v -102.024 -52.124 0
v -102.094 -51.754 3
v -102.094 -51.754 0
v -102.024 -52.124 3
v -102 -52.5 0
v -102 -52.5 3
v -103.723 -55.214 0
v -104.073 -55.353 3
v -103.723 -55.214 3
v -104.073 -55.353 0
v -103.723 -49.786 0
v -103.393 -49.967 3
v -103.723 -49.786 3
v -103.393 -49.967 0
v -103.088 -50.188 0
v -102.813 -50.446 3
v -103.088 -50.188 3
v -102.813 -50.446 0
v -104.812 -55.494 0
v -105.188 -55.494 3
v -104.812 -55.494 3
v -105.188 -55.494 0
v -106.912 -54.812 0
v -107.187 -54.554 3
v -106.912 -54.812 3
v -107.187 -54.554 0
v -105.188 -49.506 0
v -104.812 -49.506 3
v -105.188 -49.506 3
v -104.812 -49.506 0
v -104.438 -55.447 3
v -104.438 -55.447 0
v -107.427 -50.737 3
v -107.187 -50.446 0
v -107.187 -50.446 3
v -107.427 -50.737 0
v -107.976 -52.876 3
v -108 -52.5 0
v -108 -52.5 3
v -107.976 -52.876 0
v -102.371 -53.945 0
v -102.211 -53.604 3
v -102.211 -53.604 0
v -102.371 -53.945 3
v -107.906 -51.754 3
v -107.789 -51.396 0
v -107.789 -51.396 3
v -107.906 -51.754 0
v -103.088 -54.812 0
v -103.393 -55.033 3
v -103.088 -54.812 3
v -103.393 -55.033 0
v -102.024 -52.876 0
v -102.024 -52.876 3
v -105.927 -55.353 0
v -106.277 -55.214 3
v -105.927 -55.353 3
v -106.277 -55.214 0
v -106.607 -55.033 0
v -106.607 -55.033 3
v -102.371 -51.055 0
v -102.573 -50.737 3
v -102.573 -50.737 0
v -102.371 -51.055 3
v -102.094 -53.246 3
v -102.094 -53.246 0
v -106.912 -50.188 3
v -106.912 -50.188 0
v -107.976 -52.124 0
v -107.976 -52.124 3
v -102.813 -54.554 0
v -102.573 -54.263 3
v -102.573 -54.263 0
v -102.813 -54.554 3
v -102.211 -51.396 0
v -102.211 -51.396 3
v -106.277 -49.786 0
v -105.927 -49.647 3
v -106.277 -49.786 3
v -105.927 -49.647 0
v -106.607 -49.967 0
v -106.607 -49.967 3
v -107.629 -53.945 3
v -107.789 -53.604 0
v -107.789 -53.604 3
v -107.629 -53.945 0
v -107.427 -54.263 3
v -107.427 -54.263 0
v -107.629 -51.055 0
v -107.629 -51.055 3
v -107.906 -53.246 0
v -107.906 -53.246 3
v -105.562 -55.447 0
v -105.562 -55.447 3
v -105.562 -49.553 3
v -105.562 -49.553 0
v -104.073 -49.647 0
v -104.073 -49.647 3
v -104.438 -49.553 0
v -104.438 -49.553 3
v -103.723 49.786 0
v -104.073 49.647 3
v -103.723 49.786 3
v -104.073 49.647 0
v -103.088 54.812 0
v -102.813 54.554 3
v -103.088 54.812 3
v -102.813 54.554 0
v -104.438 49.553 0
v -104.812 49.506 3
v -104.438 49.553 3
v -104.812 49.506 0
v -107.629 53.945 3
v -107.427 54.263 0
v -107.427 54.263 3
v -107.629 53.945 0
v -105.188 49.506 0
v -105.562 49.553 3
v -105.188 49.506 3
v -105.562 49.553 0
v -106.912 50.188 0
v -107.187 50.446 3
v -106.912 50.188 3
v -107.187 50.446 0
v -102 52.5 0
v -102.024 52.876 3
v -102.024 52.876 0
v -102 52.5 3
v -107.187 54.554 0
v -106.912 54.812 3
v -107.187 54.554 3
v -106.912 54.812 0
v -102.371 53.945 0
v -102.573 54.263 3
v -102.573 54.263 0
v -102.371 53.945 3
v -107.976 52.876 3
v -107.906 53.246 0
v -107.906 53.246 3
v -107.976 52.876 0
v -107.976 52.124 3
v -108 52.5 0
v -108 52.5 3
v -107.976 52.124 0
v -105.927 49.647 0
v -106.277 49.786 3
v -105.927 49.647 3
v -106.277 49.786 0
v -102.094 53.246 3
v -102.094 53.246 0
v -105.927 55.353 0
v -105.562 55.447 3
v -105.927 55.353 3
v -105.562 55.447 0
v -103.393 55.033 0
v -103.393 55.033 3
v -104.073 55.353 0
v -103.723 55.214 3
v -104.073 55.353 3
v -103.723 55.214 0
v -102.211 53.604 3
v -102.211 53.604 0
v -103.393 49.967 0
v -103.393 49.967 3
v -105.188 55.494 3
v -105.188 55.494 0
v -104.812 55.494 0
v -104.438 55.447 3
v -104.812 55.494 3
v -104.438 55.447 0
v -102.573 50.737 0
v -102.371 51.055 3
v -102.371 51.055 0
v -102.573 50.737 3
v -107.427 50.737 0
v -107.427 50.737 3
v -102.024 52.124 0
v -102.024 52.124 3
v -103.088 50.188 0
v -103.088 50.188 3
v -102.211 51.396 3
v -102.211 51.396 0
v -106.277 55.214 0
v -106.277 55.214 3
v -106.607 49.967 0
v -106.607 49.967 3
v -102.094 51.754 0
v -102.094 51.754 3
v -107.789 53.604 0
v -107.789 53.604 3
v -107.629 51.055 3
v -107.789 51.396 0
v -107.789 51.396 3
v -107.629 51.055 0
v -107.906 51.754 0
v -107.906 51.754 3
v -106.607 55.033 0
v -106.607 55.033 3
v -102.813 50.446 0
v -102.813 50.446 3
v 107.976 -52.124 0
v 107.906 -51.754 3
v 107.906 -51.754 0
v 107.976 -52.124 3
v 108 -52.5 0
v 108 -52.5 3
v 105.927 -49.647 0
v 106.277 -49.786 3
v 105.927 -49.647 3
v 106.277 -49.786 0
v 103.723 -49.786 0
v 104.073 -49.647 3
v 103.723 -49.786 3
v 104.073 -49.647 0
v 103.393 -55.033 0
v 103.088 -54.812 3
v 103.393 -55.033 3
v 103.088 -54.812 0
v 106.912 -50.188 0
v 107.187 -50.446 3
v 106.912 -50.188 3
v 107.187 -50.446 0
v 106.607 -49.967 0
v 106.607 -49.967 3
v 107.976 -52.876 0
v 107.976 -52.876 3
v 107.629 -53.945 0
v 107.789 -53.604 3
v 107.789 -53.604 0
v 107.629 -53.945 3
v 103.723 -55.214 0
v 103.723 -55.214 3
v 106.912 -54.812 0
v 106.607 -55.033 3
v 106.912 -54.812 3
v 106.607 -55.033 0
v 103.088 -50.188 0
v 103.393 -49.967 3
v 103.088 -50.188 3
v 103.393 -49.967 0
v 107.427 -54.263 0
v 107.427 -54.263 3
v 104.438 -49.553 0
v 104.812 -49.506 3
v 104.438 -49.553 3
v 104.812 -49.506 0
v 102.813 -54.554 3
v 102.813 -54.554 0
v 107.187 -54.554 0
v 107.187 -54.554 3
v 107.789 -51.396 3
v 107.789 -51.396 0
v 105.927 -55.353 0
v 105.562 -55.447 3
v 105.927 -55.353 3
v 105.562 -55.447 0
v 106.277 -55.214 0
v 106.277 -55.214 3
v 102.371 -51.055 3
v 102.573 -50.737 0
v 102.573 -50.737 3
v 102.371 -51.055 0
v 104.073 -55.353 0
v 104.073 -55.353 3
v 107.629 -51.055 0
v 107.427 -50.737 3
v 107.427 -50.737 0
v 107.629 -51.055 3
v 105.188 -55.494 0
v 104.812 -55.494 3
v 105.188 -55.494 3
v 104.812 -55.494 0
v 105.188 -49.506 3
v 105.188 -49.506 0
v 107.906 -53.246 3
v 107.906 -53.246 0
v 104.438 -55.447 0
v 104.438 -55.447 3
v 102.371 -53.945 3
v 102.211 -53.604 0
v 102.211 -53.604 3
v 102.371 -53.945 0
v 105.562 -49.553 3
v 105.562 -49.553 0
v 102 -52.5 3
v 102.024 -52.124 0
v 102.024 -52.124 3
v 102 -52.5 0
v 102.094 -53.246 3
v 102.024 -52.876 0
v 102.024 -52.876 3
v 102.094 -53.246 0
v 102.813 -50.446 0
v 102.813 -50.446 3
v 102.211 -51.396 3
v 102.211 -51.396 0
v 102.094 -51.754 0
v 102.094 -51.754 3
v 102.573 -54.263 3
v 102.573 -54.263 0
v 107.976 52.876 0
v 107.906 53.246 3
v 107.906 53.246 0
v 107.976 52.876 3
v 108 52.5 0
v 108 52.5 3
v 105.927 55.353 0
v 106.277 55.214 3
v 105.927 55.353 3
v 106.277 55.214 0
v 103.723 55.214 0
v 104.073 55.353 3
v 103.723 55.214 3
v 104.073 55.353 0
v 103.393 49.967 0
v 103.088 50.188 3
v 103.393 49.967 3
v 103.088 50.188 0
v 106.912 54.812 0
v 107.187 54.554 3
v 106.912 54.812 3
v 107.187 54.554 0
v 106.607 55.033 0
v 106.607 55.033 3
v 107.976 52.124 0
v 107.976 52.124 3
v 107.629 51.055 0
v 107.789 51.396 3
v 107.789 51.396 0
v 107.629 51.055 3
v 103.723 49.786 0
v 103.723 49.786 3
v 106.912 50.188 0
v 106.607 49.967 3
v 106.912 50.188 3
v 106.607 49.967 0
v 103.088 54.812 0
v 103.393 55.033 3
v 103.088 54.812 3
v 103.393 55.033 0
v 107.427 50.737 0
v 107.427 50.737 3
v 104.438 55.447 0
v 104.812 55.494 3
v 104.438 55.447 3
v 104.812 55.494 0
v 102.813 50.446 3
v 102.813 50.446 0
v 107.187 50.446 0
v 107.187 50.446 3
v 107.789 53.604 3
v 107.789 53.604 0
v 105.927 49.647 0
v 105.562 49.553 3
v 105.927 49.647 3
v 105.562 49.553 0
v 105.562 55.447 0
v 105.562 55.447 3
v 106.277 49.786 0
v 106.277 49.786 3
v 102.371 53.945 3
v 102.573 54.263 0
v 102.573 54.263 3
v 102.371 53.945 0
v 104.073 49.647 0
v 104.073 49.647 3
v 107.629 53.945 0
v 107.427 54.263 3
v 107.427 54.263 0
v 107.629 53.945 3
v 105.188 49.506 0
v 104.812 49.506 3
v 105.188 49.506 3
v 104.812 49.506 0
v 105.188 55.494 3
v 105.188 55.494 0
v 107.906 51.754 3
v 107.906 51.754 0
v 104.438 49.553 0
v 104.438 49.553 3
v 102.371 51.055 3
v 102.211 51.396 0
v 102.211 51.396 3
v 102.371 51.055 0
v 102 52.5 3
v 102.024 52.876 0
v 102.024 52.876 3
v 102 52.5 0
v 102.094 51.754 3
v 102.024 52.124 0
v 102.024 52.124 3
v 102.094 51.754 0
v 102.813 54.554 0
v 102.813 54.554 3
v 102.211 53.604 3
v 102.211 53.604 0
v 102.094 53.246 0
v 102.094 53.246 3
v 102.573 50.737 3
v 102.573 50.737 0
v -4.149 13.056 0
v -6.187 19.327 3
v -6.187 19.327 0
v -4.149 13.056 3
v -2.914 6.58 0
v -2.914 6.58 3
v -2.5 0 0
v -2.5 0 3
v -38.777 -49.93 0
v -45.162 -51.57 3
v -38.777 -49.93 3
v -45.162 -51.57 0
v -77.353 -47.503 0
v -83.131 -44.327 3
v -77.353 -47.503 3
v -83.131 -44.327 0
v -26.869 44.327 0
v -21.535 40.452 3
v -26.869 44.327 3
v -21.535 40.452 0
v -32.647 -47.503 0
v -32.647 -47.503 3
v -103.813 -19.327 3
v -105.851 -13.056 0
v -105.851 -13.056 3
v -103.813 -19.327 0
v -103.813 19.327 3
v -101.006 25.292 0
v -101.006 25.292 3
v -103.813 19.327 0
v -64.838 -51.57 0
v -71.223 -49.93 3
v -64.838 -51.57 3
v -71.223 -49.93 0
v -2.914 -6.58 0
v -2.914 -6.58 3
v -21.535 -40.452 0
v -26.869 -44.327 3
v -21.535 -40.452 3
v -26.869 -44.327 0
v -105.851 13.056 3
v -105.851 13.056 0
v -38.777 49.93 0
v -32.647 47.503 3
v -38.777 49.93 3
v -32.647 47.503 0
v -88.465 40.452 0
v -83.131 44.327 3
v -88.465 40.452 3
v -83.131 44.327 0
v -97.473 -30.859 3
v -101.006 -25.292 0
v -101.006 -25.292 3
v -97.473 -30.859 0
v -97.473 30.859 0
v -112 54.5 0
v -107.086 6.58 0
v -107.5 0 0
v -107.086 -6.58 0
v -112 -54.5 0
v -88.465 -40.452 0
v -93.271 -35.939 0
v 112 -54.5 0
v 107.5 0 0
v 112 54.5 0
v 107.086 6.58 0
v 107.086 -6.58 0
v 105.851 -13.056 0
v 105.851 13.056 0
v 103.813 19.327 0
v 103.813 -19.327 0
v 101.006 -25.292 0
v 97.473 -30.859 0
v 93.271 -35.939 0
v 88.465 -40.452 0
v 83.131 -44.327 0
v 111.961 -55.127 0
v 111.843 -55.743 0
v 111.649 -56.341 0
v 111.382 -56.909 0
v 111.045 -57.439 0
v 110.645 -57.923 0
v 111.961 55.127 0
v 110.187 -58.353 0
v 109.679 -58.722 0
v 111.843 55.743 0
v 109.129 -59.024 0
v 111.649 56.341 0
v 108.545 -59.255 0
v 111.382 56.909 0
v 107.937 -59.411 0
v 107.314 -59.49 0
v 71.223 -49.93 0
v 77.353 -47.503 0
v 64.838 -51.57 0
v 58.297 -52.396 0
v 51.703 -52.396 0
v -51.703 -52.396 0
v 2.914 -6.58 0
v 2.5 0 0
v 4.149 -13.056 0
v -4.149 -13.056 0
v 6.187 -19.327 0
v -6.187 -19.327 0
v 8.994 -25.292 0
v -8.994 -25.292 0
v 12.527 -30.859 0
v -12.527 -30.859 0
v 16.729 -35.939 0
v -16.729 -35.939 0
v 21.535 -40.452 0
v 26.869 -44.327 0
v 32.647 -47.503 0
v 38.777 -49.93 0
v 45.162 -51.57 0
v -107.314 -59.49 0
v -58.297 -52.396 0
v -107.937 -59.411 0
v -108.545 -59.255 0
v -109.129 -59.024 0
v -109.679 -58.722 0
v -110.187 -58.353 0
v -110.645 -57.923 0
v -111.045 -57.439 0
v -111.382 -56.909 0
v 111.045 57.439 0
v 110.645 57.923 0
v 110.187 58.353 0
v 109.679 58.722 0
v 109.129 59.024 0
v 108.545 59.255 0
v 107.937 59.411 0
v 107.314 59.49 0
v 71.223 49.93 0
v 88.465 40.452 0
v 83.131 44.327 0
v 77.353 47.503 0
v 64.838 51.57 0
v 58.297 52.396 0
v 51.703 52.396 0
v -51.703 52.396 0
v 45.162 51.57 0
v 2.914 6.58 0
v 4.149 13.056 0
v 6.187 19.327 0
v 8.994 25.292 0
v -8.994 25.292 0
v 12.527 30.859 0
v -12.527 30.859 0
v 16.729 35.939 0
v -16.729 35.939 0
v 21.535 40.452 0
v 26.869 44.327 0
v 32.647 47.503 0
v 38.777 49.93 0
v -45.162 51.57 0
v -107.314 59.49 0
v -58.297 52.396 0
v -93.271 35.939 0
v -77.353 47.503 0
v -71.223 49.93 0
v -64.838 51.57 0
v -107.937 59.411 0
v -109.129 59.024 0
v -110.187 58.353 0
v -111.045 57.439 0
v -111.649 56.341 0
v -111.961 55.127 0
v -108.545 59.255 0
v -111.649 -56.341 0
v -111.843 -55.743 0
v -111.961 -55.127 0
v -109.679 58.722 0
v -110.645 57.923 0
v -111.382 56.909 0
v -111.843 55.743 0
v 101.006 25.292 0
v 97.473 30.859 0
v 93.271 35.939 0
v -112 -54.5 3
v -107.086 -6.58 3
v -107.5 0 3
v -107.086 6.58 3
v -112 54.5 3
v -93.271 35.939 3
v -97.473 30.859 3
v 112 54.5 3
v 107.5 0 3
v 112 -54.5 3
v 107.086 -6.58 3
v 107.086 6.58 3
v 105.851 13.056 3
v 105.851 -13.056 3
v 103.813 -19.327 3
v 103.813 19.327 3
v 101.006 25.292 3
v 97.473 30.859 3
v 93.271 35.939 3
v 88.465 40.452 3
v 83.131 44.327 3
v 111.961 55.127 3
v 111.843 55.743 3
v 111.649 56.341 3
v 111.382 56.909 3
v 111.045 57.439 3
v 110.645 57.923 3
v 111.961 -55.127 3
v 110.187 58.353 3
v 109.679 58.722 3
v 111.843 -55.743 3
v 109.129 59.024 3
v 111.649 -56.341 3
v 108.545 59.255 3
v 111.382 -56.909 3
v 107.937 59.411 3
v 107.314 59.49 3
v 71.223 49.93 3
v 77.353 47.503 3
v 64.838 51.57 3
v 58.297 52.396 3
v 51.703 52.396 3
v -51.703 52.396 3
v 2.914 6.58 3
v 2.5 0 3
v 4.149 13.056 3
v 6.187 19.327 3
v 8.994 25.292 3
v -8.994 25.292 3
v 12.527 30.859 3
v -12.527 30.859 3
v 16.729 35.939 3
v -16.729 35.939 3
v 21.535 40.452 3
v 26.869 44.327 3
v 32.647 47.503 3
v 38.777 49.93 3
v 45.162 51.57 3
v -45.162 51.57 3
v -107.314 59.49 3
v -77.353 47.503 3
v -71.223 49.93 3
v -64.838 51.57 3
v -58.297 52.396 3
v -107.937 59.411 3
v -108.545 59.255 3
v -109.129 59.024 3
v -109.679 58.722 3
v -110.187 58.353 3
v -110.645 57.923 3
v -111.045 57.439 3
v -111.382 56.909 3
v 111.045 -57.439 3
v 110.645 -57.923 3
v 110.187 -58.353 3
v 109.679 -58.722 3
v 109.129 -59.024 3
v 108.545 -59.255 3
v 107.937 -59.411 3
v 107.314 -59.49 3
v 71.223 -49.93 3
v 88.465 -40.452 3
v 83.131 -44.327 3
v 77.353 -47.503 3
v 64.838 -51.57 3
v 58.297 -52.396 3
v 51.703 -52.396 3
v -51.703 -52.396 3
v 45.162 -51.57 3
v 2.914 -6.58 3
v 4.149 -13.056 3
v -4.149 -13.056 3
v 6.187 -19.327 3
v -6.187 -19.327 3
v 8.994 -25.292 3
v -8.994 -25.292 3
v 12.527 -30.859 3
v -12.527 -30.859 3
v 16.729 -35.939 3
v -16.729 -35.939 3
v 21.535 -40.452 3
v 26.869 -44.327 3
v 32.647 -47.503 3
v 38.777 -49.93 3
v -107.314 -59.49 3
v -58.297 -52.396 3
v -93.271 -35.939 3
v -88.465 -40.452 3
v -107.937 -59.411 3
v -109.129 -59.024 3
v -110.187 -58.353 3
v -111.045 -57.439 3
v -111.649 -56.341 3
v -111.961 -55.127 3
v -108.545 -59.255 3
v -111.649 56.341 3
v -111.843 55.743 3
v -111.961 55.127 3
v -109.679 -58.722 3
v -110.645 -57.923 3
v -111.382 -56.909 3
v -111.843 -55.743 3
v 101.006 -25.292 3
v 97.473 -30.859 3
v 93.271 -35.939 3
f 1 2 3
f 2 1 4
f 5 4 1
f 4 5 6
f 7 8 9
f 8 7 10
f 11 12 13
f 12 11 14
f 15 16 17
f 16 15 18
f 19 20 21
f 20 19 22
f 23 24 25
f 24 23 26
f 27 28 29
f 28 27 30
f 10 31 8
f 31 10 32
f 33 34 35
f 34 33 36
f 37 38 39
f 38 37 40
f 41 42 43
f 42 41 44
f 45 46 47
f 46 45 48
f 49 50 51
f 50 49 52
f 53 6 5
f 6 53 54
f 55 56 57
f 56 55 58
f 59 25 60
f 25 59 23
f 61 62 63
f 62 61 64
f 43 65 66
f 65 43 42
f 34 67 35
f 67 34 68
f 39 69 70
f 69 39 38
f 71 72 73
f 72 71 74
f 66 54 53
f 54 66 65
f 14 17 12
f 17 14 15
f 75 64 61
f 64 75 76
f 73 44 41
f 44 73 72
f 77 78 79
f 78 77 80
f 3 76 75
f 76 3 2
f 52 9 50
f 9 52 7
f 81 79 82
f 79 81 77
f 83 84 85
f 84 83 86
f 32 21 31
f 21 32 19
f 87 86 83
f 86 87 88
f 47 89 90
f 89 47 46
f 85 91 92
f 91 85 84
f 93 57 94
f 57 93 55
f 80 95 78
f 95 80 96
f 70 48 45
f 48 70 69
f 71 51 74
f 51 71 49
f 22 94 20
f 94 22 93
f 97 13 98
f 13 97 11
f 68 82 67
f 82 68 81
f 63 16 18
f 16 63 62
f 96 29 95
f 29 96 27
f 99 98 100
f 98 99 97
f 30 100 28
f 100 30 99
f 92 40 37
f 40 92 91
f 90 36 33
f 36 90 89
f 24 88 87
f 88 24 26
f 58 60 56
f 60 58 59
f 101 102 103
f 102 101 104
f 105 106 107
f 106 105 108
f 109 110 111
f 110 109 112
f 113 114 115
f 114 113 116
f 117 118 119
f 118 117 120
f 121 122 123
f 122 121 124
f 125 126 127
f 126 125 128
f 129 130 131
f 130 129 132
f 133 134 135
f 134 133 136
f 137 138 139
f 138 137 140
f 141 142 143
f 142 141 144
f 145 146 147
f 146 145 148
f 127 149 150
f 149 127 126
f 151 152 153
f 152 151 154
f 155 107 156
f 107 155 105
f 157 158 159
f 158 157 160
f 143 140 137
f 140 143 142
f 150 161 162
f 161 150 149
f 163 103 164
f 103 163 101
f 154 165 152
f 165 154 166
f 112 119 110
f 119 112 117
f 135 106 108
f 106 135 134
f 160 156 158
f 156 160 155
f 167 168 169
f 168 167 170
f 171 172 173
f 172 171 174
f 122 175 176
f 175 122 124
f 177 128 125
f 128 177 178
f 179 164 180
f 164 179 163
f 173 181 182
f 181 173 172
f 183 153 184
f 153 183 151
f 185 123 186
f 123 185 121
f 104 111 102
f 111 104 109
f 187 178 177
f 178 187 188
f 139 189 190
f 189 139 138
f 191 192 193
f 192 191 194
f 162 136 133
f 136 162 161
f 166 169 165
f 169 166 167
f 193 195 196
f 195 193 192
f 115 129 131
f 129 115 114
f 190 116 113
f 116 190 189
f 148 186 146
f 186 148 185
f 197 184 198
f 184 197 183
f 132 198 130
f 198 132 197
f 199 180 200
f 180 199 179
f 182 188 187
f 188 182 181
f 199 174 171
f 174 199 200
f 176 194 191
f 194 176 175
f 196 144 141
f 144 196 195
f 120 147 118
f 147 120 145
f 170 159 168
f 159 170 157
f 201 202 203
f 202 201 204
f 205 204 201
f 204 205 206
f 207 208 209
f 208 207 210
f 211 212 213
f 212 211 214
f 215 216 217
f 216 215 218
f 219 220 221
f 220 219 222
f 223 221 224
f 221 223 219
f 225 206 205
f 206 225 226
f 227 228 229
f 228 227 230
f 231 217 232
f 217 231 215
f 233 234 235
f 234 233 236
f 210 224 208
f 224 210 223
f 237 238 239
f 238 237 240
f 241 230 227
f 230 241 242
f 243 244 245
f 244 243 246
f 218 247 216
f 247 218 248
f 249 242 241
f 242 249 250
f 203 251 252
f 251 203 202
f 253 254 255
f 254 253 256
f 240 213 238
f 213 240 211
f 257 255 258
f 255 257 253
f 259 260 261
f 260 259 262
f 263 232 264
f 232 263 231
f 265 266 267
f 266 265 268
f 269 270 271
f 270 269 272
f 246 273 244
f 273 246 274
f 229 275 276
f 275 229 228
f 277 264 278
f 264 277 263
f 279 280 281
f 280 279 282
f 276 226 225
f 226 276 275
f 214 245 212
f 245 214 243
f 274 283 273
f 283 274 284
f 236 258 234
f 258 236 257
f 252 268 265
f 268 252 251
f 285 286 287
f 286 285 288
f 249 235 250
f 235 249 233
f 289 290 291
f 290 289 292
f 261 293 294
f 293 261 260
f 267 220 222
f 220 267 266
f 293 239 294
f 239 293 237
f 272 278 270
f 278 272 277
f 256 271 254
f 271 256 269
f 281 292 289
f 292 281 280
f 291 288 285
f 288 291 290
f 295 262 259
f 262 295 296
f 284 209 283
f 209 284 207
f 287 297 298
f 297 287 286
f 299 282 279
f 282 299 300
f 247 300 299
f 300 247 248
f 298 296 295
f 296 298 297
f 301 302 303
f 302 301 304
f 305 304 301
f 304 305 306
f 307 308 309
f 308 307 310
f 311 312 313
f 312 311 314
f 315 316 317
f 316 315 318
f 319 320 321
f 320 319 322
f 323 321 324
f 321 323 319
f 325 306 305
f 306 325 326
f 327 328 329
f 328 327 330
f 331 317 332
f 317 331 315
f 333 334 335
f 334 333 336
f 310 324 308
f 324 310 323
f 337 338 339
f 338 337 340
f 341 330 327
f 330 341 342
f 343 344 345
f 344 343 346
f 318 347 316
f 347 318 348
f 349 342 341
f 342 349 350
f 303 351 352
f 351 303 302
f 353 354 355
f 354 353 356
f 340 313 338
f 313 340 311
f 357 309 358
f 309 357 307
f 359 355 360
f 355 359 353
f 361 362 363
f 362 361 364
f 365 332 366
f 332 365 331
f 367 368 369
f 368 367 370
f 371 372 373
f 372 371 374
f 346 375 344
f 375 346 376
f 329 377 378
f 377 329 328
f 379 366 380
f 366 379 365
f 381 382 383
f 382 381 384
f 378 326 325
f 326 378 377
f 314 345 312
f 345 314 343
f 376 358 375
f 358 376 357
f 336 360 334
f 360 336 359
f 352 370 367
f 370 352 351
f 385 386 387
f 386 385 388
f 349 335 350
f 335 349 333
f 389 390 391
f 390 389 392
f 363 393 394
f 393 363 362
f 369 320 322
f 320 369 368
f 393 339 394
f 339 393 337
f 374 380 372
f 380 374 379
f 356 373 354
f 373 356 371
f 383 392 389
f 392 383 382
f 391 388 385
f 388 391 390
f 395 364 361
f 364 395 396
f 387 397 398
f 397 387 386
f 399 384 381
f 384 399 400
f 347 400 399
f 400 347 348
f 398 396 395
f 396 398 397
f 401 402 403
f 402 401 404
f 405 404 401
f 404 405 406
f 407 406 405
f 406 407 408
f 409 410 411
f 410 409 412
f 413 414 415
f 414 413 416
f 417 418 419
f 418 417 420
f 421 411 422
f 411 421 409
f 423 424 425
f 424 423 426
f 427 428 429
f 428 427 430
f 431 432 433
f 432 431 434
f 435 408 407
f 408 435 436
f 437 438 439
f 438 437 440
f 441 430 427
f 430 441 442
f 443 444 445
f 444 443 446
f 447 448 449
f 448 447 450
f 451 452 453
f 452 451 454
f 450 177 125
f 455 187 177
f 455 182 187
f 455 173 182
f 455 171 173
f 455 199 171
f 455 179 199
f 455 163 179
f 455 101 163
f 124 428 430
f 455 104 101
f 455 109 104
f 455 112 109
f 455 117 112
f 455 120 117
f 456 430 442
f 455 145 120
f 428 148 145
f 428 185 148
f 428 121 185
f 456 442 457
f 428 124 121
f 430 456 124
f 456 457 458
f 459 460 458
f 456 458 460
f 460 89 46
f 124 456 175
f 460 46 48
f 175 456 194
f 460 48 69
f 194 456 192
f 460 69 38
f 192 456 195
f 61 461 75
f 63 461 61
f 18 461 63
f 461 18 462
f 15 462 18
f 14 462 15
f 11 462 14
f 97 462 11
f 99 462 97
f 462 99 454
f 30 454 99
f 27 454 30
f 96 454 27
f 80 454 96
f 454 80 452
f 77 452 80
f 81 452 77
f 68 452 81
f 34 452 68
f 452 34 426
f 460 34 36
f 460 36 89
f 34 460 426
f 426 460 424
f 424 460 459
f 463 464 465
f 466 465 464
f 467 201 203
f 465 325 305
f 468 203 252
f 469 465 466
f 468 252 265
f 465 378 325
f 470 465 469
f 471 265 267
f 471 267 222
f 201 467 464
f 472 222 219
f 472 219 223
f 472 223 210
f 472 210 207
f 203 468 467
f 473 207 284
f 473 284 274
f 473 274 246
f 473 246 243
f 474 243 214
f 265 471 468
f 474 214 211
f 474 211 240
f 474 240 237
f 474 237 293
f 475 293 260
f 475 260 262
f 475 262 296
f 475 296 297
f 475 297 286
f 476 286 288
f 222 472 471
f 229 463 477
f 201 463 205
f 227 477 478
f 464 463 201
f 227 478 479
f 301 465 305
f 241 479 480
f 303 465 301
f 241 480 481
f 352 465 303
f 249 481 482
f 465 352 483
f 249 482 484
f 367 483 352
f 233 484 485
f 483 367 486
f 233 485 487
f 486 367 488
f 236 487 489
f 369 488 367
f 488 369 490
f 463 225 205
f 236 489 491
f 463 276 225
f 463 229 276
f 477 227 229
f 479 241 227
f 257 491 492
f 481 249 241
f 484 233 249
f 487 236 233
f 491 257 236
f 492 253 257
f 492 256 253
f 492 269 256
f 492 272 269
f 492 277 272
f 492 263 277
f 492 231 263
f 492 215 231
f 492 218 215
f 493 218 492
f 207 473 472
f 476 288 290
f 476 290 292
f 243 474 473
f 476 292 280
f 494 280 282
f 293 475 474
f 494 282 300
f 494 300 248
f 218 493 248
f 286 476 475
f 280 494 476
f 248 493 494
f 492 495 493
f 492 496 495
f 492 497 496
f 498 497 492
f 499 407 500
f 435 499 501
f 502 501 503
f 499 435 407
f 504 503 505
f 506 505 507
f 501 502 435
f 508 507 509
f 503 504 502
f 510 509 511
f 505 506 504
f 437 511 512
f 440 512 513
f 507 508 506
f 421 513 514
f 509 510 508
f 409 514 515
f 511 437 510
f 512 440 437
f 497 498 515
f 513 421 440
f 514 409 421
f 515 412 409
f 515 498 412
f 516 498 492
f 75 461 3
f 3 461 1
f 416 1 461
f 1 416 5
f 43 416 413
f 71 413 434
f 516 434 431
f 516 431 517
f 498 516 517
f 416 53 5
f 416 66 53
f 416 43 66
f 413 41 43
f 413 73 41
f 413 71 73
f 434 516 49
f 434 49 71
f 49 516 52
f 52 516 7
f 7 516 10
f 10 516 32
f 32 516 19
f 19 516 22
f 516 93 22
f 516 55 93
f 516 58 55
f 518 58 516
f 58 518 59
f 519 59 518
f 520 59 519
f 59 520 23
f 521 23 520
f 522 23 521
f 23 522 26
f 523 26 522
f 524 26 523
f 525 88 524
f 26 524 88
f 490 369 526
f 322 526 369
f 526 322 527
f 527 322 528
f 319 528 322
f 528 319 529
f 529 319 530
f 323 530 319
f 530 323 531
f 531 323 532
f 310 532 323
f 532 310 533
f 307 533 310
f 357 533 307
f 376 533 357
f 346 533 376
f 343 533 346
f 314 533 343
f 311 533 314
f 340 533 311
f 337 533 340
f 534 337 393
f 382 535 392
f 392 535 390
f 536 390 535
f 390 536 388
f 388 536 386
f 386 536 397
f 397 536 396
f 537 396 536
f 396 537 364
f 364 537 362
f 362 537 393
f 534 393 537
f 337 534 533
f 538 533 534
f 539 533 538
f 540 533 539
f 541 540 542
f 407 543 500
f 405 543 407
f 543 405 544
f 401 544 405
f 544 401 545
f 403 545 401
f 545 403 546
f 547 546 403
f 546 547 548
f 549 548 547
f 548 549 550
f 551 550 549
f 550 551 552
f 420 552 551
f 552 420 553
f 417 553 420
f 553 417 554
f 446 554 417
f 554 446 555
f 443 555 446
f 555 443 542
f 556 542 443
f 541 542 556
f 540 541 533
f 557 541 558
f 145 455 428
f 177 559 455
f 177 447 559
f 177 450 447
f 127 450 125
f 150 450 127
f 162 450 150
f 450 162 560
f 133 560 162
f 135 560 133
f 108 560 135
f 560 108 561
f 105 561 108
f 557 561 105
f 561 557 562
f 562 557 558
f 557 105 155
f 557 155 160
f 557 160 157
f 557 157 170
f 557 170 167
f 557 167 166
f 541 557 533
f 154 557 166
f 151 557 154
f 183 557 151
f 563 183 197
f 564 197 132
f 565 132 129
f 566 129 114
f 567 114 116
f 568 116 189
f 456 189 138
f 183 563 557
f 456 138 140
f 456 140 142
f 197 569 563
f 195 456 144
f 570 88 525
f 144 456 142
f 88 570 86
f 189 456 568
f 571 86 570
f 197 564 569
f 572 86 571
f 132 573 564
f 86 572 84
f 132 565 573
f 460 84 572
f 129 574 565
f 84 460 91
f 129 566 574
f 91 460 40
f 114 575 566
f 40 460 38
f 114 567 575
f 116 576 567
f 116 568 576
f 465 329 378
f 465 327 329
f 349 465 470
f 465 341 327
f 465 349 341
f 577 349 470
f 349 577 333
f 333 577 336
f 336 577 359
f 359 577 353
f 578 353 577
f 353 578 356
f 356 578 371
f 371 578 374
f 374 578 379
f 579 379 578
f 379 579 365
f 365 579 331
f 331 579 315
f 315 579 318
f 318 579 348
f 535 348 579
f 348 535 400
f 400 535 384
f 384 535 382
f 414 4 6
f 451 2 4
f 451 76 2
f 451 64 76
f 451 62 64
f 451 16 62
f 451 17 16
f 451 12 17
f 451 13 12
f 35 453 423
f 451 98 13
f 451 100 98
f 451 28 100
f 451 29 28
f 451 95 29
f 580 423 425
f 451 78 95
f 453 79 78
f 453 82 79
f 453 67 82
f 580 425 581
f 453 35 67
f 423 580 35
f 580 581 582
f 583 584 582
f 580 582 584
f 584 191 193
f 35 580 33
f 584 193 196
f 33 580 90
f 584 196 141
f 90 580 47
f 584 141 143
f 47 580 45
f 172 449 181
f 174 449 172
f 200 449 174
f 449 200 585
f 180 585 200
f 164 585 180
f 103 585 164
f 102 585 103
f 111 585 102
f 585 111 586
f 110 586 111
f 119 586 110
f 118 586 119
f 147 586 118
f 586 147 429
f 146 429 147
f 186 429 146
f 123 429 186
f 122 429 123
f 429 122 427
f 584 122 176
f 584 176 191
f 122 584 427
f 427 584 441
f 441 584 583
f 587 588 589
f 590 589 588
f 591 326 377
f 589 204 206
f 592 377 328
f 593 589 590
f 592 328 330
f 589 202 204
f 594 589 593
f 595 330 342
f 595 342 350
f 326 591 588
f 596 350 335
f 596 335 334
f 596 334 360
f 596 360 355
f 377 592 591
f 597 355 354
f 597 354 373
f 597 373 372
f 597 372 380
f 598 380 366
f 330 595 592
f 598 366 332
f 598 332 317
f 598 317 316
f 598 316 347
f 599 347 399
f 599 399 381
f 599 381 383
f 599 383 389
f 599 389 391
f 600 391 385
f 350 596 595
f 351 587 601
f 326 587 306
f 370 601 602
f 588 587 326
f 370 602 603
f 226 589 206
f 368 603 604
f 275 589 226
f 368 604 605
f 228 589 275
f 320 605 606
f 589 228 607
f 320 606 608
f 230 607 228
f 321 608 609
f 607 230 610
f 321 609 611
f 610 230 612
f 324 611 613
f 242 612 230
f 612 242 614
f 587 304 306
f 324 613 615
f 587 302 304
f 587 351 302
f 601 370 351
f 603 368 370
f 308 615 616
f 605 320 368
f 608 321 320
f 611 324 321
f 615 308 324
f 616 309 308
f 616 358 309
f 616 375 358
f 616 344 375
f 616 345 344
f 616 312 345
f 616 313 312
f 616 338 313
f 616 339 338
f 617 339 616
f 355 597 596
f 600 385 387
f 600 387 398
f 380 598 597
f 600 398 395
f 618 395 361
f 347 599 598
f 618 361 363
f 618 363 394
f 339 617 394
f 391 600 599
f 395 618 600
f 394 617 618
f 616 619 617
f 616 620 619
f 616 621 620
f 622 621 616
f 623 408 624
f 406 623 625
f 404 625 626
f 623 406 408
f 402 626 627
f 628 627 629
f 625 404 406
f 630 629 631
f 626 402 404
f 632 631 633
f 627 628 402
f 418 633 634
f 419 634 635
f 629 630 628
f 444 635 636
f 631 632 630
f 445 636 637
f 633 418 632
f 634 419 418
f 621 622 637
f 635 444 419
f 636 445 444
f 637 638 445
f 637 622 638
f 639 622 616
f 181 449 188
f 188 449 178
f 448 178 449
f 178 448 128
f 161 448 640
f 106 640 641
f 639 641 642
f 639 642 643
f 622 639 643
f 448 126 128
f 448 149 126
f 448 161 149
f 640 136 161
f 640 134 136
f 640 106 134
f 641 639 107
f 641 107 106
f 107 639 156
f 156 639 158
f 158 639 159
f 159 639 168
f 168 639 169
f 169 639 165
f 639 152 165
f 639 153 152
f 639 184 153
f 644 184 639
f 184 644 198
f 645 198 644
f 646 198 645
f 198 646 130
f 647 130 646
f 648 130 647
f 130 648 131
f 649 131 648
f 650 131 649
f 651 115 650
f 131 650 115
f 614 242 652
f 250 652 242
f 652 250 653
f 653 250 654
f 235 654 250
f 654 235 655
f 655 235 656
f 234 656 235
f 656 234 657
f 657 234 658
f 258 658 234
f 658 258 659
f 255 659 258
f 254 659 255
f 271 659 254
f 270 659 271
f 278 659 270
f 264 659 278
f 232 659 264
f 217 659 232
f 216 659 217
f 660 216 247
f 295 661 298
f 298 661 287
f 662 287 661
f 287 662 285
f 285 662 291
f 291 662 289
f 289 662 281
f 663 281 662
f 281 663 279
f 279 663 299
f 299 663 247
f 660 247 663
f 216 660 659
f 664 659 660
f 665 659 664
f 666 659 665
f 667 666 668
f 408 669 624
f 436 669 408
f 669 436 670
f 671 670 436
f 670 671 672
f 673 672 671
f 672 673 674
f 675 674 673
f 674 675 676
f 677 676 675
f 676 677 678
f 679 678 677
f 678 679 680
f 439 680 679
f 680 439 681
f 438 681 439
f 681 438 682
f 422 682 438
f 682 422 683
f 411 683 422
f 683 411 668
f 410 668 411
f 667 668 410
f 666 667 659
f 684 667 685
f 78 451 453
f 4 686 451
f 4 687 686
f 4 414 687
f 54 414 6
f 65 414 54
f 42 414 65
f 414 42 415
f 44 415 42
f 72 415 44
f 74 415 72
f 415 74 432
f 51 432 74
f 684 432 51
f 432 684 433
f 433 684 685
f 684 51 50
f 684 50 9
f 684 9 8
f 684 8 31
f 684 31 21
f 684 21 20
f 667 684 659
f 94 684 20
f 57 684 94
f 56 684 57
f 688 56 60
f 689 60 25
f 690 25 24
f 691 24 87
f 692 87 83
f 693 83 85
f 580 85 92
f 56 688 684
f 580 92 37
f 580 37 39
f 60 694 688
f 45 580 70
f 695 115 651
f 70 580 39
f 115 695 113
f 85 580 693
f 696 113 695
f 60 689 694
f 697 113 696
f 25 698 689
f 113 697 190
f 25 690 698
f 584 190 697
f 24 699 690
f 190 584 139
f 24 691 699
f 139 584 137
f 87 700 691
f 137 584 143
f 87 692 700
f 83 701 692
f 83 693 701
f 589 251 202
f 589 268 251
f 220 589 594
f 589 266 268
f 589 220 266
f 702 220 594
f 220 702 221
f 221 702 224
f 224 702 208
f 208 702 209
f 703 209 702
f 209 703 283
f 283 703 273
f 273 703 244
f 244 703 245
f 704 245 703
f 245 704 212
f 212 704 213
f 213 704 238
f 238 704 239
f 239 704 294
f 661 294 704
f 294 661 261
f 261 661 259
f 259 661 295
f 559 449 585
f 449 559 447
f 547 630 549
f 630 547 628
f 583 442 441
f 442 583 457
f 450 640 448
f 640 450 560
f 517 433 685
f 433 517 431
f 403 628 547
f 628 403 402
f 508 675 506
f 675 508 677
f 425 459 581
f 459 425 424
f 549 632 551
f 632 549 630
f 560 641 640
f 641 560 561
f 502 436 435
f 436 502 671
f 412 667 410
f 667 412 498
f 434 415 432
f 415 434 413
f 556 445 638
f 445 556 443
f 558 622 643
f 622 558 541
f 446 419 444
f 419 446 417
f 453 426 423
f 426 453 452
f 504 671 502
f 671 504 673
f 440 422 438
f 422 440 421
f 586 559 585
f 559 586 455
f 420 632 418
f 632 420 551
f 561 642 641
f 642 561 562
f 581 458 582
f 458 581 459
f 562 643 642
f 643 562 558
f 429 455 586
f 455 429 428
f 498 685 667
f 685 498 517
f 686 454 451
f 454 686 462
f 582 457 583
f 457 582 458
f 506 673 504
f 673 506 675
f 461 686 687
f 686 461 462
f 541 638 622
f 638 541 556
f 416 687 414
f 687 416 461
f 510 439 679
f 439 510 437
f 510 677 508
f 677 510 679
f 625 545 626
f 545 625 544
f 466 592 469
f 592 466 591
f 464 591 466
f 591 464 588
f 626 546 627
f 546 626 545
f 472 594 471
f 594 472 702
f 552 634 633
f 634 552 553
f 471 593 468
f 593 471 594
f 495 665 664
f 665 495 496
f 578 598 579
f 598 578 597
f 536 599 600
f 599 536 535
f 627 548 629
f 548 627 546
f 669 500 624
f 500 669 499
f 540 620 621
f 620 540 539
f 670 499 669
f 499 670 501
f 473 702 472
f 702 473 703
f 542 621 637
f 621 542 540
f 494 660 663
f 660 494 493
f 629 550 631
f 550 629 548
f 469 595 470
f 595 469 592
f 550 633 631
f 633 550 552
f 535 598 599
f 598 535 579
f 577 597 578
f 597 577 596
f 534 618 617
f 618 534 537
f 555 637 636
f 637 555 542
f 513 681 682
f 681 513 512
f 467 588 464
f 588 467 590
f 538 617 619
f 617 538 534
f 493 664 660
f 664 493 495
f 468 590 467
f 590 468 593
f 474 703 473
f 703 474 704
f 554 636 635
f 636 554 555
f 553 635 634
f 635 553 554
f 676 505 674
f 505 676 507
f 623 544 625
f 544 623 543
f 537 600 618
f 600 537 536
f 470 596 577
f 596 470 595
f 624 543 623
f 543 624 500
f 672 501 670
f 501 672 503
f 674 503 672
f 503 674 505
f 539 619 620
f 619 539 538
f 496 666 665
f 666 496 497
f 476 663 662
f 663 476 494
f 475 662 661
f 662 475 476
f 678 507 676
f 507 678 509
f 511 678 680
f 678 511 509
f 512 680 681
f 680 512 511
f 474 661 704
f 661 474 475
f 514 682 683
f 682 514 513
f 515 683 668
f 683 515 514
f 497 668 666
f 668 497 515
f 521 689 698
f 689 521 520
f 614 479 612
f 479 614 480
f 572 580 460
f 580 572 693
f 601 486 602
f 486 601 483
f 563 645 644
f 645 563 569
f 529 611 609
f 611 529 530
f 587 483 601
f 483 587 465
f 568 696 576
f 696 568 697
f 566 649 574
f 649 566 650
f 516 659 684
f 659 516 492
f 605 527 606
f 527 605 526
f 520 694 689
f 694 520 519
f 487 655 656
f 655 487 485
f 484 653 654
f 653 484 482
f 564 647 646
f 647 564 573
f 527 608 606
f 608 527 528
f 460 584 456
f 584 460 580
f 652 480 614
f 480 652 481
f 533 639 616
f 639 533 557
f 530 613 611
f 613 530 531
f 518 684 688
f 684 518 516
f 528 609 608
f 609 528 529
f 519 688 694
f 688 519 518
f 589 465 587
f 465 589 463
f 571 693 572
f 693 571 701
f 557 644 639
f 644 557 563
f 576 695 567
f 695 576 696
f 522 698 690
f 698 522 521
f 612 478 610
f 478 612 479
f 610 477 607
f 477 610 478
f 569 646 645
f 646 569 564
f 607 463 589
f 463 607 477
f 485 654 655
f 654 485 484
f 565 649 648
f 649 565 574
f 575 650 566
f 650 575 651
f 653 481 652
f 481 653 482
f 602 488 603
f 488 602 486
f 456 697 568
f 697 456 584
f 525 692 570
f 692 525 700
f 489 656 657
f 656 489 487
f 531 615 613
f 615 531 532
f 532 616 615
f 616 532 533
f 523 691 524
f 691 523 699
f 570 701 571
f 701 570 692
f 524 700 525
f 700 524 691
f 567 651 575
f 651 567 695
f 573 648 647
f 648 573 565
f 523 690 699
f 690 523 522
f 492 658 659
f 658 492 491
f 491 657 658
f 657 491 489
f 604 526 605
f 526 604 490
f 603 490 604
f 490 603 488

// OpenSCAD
$fn = 50;


difference() {
	union() {
		hull() {
			translate(v = [-107.0000000000, 54.5000000000, 0]) {
				cylinder(h = 3, r = 5);
			}
			translate(v = [107.0000000000, 54.5000000000, 0]) {
				cylinder(h = 3, r = 5);
			}
			translate(v = [-107.0000000000, -54.5000000000, 0]) {
				cylinder(h = 3, r = 5);
			}
			translate(v = [107.0000000000, -54.5000000000, 0]) {
				cylinder(h = 3, r = 5);
			}
		}
	}
	union() {
		#translate(v = [-105.0000000000, -52.5000000000, -100.0000000000]) {
			cylinder(h = 200, r = 3.0000000000);
		}
		#translate(v = [-105.0000000000, 52.5000000000, -100.0000000000]) {
			cylinder(h = 200, r = 3.0000000000);
		}
		#translate(v = [105.0000000000, -52.5000000000, -100.0000000000]) {
			cylinder(h = 200, r = 3.0000000000);
		}
		#translate(v = [105.0000000000, 52.5000000000, -100.0000000000]) {
			cylinder(h = 200, r = 3.0000000000);
		}
		#translate(v = [-55.0000000000, 0, 0]) {
			cylinder(h = 3, r = 52.5000000000);
		}
		#translate(v = [55.0000000000, 0, 0]) {
			cylinder(h = 3, r = 52.5000000000);
		}
	}
}
